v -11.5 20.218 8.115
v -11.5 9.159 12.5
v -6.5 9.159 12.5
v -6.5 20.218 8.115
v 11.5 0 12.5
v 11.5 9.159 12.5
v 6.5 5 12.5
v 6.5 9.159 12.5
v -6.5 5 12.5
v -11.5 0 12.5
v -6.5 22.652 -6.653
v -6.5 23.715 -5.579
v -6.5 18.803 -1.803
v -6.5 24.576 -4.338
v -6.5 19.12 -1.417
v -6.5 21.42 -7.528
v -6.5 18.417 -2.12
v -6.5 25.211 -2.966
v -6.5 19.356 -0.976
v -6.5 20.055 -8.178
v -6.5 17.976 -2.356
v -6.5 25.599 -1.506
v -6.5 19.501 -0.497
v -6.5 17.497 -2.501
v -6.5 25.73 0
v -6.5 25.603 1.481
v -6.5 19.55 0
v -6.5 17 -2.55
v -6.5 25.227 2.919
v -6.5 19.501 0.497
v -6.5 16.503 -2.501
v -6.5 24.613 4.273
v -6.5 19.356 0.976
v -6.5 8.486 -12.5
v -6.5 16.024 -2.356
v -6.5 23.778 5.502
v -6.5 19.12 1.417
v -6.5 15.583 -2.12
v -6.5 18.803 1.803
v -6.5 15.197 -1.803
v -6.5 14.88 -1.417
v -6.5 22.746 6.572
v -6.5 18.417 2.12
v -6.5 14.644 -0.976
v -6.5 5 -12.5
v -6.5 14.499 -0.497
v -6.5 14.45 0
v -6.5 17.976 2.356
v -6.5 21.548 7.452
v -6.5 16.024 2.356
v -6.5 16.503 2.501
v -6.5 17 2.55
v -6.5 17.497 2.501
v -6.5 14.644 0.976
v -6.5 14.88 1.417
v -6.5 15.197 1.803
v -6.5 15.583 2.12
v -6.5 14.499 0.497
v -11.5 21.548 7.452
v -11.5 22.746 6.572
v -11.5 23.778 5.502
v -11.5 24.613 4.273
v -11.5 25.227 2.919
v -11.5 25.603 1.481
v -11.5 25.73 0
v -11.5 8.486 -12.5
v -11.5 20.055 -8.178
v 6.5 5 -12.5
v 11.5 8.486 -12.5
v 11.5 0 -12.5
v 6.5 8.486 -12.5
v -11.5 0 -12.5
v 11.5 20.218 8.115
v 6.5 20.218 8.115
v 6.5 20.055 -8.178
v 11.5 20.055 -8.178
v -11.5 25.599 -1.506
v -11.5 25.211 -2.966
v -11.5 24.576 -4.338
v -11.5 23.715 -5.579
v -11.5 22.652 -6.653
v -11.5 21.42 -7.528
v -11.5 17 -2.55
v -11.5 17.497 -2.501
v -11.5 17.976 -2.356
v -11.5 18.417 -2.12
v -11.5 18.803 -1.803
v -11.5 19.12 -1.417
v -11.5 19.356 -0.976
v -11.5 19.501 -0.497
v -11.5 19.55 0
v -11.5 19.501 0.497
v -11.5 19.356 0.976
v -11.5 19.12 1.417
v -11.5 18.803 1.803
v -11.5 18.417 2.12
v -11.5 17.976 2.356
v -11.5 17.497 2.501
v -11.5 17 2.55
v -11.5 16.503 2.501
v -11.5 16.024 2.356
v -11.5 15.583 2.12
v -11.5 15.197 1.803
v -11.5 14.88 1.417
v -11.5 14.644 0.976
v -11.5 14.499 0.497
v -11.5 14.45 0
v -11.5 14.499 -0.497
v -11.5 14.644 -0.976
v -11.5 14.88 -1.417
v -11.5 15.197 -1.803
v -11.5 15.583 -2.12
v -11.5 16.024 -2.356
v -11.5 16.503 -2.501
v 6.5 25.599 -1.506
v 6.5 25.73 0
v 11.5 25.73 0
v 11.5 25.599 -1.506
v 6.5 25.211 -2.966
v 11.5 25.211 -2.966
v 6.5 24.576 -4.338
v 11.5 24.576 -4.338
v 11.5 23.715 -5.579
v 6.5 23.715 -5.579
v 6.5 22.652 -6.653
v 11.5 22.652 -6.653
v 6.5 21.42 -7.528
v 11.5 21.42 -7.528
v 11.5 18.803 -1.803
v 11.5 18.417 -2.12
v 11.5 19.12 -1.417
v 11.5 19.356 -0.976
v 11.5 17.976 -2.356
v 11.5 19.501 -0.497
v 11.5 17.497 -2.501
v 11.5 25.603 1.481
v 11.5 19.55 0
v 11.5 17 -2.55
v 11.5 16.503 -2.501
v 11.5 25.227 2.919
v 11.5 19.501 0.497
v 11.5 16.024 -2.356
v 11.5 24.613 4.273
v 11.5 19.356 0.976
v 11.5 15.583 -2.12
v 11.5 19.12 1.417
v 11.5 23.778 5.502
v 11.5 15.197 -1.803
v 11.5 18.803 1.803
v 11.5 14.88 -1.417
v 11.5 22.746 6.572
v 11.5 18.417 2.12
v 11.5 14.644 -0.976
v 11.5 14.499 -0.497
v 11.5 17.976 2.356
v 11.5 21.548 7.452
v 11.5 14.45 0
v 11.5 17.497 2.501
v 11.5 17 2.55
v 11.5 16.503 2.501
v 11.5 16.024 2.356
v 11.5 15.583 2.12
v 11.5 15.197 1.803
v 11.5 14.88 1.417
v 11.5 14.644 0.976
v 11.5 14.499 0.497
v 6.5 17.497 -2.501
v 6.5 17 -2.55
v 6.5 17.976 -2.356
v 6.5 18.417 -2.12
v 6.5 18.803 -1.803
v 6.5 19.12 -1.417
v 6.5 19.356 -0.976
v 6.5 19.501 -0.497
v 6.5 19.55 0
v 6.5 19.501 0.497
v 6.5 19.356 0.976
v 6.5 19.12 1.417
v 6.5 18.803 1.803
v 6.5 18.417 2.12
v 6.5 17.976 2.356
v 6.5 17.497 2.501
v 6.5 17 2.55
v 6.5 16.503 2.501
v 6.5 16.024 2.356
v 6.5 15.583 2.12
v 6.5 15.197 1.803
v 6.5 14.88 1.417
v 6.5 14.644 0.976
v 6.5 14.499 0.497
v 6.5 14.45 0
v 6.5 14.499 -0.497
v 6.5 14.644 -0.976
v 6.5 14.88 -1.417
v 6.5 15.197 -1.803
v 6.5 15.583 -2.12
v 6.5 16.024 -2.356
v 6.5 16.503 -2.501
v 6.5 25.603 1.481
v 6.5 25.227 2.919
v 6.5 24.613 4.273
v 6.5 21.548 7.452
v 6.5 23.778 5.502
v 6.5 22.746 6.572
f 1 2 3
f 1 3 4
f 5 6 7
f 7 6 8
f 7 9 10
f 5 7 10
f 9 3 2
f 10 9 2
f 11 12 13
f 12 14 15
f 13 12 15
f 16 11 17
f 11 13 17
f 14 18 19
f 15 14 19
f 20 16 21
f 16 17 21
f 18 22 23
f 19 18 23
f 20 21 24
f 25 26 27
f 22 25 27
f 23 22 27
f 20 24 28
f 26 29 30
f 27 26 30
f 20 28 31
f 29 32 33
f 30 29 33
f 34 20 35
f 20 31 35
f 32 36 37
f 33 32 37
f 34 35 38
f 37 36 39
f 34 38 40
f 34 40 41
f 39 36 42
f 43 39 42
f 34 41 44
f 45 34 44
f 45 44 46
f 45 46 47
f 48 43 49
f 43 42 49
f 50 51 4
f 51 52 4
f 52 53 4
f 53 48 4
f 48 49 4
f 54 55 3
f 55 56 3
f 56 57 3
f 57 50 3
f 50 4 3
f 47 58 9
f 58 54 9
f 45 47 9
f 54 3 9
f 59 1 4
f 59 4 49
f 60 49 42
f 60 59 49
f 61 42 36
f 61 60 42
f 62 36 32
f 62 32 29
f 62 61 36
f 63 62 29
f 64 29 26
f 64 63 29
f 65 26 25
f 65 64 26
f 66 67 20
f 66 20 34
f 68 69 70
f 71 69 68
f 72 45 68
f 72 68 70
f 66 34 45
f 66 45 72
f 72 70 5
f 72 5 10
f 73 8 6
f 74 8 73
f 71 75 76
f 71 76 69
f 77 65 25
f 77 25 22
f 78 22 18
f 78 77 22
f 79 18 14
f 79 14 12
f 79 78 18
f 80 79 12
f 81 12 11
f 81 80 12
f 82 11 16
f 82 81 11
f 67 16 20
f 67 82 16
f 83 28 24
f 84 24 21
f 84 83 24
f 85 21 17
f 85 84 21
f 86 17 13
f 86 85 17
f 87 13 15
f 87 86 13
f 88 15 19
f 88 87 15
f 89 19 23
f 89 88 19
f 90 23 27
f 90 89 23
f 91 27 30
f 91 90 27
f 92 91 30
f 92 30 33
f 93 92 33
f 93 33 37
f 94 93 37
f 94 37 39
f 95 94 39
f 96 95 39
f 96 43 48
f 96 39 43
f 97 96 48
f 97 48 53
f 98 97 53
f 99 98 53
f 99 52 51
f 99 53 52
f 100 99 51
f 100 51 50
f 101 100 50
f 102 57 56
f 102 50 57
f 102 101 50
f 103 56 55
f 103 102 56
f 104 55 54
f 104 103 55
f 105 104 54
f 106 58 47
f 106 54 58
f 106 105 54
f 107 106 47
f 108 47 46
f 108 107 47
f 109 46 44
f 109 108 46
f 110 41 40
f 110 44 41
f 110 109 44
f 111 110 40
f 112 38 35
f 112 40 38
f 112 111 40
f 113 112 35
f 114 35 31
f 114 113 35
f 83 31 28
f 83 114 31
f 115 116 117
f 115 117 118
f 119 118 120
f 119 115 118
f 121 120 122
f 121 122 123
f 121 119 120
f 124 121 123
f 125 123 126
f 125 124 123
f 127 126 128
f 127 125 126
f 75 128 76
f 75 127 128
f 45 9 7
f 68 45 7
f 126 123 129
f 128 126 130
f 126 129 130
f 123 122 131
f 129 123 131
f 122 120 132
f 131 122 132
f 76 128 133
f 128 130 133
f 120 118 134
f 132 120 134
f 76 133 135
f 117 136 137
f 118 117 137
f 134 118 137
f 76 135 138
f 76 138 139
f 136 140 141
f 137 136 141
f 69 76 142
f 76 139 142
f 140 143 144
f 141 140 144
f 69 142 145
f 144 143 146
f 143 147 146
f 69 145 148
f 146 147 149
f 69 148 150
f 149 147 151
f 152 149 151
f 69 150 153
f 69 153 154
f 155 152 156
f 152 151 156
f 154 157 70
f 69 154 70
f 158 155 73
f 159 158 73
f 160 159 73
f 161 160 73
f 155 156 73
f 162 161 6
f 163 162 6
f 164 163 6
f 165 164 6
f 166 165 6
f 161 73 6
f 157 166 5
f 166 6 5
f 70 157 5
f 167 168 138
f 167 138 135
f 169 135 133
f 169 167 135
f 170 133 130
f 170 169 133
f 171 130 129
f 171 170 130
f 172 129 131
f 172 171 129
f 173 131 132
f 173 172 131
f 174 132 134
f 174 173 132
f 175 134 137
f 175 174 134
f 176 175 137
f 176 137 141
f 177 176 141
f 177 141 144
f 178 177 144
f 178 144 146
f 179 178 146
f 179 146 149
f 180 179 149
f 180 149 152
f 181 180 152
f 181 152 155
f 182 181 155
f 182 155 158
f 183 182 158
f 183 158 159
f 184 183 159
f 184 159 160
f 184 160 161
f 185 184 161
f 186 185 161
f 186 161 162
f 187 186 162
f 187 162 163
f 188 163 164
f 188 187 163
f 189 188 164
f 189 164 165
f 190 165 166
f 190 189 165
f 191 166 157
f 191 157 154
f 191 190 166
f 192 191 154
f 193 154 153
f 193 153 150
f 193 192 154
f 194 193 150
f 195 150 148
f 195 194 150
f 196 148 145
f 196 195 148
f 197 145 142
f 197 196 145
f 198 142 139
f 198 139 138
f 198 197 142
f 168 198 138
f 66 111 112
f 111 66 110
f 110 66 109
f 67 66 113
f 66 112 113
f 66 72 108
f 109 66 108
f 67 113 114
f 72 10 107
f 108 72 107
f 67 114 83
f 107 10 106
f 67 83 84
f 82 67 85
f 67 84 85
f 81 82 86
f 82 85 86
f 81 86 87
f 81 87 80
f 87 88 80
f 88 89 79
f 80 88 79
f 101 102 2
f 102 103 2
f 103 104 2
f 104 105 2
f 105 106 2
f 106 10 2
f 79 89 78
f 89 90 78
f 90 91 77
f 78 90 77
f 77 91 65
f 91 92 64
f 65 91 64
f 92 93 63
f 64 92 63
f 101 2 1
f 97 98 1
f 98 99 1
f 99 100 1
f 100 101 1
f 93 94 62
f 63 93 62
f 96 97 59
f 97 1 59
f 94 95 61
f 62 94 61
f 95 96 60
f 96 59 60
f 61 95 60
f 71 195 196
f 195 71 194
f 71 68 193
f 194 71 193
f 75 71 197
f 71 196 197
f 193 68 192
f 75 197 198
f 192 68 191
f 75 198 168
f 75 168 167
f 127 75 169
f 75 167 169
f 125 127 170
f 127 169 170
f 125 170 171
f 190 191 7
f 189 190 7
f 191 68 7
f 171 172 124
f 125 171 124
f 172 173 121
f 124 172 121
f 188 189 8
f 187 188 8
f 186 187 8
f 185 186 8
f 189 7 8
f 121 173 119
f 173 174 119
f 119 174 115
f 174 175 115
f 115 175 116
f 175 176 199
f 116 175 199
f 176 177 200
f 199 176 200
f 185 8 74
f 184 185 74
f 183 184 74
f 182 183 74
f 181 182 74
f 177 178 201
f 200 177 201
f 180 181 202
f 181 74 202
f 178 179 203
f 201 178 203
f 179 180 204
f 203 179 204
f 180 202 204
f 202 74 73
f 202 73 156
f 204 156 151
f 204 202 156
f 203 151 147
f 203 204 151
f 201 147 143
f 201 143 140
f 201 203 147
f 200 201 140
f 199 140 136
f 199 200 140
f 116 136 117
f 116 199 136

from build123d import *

# Parameters (mm, degrees)
BOSS_EXTRUDE1_DEPTH = 12.5
SKETCH2_R           = 2.55
CUT_EXTRUDE1_DEPTH  = 21.5


with BuildPart() as part:
    # Sketch1 → Boss-Extrude1 (new, symmetric)
    with BuildSketch(Plane.XY):
        Polygon((-6.5, 5), (6.5, 5), (6.5, 25.729927007), (11.5, 25.729927007), (11.5, 0), (-11.5, 0), (-11.5, 25.729927007), (-6.5, 25.729927007), align=None)
    extrude(amount=BOSS_EXTRUDE1_DEPTH, both=True)

    # Sketch2 → Cut-Extrude1 (cut, symmetric)
    with BuildSketch(Plane(origin=(0, 0, 0), x_dir=(0, 0, -1), z_dir=(1, 0, 0))):
        with BuildLine():
            Line((-12.5, 25.729927007), (-12.5, 9.159373111))
            Line((-12.5, 9.159373111), (-8.115271661, 20.217761866))
            ThreePointArc((-8.115271661, 20.217761866), (-4.905140127, 24.221580567), (0, 25.729927007))
            Line((0, 25.729927007), (-12.5, 25.729927007))
        make_face()
        with BuildLine():
            Line((12.5, 25.729927007), (0, 25.729927007))
            ThreePointArc((0, 25.729927007), (4.976994116, 24.172248958), (8.177901336, 20.055086791))
            Line((8.177901336, 20.055086791), (12.5, 8.485629403))
            Line((12.5, 8.485629403), (12.5, 25.729927007))
        make_face()
        with Locations((0, 17)):
            Circle(SKETCH2_R)
    extrude(amount=CUT_EXTRUDE1_DEPTH, both=True, mode=Mode.SUBTRACT)


solid = part.part
